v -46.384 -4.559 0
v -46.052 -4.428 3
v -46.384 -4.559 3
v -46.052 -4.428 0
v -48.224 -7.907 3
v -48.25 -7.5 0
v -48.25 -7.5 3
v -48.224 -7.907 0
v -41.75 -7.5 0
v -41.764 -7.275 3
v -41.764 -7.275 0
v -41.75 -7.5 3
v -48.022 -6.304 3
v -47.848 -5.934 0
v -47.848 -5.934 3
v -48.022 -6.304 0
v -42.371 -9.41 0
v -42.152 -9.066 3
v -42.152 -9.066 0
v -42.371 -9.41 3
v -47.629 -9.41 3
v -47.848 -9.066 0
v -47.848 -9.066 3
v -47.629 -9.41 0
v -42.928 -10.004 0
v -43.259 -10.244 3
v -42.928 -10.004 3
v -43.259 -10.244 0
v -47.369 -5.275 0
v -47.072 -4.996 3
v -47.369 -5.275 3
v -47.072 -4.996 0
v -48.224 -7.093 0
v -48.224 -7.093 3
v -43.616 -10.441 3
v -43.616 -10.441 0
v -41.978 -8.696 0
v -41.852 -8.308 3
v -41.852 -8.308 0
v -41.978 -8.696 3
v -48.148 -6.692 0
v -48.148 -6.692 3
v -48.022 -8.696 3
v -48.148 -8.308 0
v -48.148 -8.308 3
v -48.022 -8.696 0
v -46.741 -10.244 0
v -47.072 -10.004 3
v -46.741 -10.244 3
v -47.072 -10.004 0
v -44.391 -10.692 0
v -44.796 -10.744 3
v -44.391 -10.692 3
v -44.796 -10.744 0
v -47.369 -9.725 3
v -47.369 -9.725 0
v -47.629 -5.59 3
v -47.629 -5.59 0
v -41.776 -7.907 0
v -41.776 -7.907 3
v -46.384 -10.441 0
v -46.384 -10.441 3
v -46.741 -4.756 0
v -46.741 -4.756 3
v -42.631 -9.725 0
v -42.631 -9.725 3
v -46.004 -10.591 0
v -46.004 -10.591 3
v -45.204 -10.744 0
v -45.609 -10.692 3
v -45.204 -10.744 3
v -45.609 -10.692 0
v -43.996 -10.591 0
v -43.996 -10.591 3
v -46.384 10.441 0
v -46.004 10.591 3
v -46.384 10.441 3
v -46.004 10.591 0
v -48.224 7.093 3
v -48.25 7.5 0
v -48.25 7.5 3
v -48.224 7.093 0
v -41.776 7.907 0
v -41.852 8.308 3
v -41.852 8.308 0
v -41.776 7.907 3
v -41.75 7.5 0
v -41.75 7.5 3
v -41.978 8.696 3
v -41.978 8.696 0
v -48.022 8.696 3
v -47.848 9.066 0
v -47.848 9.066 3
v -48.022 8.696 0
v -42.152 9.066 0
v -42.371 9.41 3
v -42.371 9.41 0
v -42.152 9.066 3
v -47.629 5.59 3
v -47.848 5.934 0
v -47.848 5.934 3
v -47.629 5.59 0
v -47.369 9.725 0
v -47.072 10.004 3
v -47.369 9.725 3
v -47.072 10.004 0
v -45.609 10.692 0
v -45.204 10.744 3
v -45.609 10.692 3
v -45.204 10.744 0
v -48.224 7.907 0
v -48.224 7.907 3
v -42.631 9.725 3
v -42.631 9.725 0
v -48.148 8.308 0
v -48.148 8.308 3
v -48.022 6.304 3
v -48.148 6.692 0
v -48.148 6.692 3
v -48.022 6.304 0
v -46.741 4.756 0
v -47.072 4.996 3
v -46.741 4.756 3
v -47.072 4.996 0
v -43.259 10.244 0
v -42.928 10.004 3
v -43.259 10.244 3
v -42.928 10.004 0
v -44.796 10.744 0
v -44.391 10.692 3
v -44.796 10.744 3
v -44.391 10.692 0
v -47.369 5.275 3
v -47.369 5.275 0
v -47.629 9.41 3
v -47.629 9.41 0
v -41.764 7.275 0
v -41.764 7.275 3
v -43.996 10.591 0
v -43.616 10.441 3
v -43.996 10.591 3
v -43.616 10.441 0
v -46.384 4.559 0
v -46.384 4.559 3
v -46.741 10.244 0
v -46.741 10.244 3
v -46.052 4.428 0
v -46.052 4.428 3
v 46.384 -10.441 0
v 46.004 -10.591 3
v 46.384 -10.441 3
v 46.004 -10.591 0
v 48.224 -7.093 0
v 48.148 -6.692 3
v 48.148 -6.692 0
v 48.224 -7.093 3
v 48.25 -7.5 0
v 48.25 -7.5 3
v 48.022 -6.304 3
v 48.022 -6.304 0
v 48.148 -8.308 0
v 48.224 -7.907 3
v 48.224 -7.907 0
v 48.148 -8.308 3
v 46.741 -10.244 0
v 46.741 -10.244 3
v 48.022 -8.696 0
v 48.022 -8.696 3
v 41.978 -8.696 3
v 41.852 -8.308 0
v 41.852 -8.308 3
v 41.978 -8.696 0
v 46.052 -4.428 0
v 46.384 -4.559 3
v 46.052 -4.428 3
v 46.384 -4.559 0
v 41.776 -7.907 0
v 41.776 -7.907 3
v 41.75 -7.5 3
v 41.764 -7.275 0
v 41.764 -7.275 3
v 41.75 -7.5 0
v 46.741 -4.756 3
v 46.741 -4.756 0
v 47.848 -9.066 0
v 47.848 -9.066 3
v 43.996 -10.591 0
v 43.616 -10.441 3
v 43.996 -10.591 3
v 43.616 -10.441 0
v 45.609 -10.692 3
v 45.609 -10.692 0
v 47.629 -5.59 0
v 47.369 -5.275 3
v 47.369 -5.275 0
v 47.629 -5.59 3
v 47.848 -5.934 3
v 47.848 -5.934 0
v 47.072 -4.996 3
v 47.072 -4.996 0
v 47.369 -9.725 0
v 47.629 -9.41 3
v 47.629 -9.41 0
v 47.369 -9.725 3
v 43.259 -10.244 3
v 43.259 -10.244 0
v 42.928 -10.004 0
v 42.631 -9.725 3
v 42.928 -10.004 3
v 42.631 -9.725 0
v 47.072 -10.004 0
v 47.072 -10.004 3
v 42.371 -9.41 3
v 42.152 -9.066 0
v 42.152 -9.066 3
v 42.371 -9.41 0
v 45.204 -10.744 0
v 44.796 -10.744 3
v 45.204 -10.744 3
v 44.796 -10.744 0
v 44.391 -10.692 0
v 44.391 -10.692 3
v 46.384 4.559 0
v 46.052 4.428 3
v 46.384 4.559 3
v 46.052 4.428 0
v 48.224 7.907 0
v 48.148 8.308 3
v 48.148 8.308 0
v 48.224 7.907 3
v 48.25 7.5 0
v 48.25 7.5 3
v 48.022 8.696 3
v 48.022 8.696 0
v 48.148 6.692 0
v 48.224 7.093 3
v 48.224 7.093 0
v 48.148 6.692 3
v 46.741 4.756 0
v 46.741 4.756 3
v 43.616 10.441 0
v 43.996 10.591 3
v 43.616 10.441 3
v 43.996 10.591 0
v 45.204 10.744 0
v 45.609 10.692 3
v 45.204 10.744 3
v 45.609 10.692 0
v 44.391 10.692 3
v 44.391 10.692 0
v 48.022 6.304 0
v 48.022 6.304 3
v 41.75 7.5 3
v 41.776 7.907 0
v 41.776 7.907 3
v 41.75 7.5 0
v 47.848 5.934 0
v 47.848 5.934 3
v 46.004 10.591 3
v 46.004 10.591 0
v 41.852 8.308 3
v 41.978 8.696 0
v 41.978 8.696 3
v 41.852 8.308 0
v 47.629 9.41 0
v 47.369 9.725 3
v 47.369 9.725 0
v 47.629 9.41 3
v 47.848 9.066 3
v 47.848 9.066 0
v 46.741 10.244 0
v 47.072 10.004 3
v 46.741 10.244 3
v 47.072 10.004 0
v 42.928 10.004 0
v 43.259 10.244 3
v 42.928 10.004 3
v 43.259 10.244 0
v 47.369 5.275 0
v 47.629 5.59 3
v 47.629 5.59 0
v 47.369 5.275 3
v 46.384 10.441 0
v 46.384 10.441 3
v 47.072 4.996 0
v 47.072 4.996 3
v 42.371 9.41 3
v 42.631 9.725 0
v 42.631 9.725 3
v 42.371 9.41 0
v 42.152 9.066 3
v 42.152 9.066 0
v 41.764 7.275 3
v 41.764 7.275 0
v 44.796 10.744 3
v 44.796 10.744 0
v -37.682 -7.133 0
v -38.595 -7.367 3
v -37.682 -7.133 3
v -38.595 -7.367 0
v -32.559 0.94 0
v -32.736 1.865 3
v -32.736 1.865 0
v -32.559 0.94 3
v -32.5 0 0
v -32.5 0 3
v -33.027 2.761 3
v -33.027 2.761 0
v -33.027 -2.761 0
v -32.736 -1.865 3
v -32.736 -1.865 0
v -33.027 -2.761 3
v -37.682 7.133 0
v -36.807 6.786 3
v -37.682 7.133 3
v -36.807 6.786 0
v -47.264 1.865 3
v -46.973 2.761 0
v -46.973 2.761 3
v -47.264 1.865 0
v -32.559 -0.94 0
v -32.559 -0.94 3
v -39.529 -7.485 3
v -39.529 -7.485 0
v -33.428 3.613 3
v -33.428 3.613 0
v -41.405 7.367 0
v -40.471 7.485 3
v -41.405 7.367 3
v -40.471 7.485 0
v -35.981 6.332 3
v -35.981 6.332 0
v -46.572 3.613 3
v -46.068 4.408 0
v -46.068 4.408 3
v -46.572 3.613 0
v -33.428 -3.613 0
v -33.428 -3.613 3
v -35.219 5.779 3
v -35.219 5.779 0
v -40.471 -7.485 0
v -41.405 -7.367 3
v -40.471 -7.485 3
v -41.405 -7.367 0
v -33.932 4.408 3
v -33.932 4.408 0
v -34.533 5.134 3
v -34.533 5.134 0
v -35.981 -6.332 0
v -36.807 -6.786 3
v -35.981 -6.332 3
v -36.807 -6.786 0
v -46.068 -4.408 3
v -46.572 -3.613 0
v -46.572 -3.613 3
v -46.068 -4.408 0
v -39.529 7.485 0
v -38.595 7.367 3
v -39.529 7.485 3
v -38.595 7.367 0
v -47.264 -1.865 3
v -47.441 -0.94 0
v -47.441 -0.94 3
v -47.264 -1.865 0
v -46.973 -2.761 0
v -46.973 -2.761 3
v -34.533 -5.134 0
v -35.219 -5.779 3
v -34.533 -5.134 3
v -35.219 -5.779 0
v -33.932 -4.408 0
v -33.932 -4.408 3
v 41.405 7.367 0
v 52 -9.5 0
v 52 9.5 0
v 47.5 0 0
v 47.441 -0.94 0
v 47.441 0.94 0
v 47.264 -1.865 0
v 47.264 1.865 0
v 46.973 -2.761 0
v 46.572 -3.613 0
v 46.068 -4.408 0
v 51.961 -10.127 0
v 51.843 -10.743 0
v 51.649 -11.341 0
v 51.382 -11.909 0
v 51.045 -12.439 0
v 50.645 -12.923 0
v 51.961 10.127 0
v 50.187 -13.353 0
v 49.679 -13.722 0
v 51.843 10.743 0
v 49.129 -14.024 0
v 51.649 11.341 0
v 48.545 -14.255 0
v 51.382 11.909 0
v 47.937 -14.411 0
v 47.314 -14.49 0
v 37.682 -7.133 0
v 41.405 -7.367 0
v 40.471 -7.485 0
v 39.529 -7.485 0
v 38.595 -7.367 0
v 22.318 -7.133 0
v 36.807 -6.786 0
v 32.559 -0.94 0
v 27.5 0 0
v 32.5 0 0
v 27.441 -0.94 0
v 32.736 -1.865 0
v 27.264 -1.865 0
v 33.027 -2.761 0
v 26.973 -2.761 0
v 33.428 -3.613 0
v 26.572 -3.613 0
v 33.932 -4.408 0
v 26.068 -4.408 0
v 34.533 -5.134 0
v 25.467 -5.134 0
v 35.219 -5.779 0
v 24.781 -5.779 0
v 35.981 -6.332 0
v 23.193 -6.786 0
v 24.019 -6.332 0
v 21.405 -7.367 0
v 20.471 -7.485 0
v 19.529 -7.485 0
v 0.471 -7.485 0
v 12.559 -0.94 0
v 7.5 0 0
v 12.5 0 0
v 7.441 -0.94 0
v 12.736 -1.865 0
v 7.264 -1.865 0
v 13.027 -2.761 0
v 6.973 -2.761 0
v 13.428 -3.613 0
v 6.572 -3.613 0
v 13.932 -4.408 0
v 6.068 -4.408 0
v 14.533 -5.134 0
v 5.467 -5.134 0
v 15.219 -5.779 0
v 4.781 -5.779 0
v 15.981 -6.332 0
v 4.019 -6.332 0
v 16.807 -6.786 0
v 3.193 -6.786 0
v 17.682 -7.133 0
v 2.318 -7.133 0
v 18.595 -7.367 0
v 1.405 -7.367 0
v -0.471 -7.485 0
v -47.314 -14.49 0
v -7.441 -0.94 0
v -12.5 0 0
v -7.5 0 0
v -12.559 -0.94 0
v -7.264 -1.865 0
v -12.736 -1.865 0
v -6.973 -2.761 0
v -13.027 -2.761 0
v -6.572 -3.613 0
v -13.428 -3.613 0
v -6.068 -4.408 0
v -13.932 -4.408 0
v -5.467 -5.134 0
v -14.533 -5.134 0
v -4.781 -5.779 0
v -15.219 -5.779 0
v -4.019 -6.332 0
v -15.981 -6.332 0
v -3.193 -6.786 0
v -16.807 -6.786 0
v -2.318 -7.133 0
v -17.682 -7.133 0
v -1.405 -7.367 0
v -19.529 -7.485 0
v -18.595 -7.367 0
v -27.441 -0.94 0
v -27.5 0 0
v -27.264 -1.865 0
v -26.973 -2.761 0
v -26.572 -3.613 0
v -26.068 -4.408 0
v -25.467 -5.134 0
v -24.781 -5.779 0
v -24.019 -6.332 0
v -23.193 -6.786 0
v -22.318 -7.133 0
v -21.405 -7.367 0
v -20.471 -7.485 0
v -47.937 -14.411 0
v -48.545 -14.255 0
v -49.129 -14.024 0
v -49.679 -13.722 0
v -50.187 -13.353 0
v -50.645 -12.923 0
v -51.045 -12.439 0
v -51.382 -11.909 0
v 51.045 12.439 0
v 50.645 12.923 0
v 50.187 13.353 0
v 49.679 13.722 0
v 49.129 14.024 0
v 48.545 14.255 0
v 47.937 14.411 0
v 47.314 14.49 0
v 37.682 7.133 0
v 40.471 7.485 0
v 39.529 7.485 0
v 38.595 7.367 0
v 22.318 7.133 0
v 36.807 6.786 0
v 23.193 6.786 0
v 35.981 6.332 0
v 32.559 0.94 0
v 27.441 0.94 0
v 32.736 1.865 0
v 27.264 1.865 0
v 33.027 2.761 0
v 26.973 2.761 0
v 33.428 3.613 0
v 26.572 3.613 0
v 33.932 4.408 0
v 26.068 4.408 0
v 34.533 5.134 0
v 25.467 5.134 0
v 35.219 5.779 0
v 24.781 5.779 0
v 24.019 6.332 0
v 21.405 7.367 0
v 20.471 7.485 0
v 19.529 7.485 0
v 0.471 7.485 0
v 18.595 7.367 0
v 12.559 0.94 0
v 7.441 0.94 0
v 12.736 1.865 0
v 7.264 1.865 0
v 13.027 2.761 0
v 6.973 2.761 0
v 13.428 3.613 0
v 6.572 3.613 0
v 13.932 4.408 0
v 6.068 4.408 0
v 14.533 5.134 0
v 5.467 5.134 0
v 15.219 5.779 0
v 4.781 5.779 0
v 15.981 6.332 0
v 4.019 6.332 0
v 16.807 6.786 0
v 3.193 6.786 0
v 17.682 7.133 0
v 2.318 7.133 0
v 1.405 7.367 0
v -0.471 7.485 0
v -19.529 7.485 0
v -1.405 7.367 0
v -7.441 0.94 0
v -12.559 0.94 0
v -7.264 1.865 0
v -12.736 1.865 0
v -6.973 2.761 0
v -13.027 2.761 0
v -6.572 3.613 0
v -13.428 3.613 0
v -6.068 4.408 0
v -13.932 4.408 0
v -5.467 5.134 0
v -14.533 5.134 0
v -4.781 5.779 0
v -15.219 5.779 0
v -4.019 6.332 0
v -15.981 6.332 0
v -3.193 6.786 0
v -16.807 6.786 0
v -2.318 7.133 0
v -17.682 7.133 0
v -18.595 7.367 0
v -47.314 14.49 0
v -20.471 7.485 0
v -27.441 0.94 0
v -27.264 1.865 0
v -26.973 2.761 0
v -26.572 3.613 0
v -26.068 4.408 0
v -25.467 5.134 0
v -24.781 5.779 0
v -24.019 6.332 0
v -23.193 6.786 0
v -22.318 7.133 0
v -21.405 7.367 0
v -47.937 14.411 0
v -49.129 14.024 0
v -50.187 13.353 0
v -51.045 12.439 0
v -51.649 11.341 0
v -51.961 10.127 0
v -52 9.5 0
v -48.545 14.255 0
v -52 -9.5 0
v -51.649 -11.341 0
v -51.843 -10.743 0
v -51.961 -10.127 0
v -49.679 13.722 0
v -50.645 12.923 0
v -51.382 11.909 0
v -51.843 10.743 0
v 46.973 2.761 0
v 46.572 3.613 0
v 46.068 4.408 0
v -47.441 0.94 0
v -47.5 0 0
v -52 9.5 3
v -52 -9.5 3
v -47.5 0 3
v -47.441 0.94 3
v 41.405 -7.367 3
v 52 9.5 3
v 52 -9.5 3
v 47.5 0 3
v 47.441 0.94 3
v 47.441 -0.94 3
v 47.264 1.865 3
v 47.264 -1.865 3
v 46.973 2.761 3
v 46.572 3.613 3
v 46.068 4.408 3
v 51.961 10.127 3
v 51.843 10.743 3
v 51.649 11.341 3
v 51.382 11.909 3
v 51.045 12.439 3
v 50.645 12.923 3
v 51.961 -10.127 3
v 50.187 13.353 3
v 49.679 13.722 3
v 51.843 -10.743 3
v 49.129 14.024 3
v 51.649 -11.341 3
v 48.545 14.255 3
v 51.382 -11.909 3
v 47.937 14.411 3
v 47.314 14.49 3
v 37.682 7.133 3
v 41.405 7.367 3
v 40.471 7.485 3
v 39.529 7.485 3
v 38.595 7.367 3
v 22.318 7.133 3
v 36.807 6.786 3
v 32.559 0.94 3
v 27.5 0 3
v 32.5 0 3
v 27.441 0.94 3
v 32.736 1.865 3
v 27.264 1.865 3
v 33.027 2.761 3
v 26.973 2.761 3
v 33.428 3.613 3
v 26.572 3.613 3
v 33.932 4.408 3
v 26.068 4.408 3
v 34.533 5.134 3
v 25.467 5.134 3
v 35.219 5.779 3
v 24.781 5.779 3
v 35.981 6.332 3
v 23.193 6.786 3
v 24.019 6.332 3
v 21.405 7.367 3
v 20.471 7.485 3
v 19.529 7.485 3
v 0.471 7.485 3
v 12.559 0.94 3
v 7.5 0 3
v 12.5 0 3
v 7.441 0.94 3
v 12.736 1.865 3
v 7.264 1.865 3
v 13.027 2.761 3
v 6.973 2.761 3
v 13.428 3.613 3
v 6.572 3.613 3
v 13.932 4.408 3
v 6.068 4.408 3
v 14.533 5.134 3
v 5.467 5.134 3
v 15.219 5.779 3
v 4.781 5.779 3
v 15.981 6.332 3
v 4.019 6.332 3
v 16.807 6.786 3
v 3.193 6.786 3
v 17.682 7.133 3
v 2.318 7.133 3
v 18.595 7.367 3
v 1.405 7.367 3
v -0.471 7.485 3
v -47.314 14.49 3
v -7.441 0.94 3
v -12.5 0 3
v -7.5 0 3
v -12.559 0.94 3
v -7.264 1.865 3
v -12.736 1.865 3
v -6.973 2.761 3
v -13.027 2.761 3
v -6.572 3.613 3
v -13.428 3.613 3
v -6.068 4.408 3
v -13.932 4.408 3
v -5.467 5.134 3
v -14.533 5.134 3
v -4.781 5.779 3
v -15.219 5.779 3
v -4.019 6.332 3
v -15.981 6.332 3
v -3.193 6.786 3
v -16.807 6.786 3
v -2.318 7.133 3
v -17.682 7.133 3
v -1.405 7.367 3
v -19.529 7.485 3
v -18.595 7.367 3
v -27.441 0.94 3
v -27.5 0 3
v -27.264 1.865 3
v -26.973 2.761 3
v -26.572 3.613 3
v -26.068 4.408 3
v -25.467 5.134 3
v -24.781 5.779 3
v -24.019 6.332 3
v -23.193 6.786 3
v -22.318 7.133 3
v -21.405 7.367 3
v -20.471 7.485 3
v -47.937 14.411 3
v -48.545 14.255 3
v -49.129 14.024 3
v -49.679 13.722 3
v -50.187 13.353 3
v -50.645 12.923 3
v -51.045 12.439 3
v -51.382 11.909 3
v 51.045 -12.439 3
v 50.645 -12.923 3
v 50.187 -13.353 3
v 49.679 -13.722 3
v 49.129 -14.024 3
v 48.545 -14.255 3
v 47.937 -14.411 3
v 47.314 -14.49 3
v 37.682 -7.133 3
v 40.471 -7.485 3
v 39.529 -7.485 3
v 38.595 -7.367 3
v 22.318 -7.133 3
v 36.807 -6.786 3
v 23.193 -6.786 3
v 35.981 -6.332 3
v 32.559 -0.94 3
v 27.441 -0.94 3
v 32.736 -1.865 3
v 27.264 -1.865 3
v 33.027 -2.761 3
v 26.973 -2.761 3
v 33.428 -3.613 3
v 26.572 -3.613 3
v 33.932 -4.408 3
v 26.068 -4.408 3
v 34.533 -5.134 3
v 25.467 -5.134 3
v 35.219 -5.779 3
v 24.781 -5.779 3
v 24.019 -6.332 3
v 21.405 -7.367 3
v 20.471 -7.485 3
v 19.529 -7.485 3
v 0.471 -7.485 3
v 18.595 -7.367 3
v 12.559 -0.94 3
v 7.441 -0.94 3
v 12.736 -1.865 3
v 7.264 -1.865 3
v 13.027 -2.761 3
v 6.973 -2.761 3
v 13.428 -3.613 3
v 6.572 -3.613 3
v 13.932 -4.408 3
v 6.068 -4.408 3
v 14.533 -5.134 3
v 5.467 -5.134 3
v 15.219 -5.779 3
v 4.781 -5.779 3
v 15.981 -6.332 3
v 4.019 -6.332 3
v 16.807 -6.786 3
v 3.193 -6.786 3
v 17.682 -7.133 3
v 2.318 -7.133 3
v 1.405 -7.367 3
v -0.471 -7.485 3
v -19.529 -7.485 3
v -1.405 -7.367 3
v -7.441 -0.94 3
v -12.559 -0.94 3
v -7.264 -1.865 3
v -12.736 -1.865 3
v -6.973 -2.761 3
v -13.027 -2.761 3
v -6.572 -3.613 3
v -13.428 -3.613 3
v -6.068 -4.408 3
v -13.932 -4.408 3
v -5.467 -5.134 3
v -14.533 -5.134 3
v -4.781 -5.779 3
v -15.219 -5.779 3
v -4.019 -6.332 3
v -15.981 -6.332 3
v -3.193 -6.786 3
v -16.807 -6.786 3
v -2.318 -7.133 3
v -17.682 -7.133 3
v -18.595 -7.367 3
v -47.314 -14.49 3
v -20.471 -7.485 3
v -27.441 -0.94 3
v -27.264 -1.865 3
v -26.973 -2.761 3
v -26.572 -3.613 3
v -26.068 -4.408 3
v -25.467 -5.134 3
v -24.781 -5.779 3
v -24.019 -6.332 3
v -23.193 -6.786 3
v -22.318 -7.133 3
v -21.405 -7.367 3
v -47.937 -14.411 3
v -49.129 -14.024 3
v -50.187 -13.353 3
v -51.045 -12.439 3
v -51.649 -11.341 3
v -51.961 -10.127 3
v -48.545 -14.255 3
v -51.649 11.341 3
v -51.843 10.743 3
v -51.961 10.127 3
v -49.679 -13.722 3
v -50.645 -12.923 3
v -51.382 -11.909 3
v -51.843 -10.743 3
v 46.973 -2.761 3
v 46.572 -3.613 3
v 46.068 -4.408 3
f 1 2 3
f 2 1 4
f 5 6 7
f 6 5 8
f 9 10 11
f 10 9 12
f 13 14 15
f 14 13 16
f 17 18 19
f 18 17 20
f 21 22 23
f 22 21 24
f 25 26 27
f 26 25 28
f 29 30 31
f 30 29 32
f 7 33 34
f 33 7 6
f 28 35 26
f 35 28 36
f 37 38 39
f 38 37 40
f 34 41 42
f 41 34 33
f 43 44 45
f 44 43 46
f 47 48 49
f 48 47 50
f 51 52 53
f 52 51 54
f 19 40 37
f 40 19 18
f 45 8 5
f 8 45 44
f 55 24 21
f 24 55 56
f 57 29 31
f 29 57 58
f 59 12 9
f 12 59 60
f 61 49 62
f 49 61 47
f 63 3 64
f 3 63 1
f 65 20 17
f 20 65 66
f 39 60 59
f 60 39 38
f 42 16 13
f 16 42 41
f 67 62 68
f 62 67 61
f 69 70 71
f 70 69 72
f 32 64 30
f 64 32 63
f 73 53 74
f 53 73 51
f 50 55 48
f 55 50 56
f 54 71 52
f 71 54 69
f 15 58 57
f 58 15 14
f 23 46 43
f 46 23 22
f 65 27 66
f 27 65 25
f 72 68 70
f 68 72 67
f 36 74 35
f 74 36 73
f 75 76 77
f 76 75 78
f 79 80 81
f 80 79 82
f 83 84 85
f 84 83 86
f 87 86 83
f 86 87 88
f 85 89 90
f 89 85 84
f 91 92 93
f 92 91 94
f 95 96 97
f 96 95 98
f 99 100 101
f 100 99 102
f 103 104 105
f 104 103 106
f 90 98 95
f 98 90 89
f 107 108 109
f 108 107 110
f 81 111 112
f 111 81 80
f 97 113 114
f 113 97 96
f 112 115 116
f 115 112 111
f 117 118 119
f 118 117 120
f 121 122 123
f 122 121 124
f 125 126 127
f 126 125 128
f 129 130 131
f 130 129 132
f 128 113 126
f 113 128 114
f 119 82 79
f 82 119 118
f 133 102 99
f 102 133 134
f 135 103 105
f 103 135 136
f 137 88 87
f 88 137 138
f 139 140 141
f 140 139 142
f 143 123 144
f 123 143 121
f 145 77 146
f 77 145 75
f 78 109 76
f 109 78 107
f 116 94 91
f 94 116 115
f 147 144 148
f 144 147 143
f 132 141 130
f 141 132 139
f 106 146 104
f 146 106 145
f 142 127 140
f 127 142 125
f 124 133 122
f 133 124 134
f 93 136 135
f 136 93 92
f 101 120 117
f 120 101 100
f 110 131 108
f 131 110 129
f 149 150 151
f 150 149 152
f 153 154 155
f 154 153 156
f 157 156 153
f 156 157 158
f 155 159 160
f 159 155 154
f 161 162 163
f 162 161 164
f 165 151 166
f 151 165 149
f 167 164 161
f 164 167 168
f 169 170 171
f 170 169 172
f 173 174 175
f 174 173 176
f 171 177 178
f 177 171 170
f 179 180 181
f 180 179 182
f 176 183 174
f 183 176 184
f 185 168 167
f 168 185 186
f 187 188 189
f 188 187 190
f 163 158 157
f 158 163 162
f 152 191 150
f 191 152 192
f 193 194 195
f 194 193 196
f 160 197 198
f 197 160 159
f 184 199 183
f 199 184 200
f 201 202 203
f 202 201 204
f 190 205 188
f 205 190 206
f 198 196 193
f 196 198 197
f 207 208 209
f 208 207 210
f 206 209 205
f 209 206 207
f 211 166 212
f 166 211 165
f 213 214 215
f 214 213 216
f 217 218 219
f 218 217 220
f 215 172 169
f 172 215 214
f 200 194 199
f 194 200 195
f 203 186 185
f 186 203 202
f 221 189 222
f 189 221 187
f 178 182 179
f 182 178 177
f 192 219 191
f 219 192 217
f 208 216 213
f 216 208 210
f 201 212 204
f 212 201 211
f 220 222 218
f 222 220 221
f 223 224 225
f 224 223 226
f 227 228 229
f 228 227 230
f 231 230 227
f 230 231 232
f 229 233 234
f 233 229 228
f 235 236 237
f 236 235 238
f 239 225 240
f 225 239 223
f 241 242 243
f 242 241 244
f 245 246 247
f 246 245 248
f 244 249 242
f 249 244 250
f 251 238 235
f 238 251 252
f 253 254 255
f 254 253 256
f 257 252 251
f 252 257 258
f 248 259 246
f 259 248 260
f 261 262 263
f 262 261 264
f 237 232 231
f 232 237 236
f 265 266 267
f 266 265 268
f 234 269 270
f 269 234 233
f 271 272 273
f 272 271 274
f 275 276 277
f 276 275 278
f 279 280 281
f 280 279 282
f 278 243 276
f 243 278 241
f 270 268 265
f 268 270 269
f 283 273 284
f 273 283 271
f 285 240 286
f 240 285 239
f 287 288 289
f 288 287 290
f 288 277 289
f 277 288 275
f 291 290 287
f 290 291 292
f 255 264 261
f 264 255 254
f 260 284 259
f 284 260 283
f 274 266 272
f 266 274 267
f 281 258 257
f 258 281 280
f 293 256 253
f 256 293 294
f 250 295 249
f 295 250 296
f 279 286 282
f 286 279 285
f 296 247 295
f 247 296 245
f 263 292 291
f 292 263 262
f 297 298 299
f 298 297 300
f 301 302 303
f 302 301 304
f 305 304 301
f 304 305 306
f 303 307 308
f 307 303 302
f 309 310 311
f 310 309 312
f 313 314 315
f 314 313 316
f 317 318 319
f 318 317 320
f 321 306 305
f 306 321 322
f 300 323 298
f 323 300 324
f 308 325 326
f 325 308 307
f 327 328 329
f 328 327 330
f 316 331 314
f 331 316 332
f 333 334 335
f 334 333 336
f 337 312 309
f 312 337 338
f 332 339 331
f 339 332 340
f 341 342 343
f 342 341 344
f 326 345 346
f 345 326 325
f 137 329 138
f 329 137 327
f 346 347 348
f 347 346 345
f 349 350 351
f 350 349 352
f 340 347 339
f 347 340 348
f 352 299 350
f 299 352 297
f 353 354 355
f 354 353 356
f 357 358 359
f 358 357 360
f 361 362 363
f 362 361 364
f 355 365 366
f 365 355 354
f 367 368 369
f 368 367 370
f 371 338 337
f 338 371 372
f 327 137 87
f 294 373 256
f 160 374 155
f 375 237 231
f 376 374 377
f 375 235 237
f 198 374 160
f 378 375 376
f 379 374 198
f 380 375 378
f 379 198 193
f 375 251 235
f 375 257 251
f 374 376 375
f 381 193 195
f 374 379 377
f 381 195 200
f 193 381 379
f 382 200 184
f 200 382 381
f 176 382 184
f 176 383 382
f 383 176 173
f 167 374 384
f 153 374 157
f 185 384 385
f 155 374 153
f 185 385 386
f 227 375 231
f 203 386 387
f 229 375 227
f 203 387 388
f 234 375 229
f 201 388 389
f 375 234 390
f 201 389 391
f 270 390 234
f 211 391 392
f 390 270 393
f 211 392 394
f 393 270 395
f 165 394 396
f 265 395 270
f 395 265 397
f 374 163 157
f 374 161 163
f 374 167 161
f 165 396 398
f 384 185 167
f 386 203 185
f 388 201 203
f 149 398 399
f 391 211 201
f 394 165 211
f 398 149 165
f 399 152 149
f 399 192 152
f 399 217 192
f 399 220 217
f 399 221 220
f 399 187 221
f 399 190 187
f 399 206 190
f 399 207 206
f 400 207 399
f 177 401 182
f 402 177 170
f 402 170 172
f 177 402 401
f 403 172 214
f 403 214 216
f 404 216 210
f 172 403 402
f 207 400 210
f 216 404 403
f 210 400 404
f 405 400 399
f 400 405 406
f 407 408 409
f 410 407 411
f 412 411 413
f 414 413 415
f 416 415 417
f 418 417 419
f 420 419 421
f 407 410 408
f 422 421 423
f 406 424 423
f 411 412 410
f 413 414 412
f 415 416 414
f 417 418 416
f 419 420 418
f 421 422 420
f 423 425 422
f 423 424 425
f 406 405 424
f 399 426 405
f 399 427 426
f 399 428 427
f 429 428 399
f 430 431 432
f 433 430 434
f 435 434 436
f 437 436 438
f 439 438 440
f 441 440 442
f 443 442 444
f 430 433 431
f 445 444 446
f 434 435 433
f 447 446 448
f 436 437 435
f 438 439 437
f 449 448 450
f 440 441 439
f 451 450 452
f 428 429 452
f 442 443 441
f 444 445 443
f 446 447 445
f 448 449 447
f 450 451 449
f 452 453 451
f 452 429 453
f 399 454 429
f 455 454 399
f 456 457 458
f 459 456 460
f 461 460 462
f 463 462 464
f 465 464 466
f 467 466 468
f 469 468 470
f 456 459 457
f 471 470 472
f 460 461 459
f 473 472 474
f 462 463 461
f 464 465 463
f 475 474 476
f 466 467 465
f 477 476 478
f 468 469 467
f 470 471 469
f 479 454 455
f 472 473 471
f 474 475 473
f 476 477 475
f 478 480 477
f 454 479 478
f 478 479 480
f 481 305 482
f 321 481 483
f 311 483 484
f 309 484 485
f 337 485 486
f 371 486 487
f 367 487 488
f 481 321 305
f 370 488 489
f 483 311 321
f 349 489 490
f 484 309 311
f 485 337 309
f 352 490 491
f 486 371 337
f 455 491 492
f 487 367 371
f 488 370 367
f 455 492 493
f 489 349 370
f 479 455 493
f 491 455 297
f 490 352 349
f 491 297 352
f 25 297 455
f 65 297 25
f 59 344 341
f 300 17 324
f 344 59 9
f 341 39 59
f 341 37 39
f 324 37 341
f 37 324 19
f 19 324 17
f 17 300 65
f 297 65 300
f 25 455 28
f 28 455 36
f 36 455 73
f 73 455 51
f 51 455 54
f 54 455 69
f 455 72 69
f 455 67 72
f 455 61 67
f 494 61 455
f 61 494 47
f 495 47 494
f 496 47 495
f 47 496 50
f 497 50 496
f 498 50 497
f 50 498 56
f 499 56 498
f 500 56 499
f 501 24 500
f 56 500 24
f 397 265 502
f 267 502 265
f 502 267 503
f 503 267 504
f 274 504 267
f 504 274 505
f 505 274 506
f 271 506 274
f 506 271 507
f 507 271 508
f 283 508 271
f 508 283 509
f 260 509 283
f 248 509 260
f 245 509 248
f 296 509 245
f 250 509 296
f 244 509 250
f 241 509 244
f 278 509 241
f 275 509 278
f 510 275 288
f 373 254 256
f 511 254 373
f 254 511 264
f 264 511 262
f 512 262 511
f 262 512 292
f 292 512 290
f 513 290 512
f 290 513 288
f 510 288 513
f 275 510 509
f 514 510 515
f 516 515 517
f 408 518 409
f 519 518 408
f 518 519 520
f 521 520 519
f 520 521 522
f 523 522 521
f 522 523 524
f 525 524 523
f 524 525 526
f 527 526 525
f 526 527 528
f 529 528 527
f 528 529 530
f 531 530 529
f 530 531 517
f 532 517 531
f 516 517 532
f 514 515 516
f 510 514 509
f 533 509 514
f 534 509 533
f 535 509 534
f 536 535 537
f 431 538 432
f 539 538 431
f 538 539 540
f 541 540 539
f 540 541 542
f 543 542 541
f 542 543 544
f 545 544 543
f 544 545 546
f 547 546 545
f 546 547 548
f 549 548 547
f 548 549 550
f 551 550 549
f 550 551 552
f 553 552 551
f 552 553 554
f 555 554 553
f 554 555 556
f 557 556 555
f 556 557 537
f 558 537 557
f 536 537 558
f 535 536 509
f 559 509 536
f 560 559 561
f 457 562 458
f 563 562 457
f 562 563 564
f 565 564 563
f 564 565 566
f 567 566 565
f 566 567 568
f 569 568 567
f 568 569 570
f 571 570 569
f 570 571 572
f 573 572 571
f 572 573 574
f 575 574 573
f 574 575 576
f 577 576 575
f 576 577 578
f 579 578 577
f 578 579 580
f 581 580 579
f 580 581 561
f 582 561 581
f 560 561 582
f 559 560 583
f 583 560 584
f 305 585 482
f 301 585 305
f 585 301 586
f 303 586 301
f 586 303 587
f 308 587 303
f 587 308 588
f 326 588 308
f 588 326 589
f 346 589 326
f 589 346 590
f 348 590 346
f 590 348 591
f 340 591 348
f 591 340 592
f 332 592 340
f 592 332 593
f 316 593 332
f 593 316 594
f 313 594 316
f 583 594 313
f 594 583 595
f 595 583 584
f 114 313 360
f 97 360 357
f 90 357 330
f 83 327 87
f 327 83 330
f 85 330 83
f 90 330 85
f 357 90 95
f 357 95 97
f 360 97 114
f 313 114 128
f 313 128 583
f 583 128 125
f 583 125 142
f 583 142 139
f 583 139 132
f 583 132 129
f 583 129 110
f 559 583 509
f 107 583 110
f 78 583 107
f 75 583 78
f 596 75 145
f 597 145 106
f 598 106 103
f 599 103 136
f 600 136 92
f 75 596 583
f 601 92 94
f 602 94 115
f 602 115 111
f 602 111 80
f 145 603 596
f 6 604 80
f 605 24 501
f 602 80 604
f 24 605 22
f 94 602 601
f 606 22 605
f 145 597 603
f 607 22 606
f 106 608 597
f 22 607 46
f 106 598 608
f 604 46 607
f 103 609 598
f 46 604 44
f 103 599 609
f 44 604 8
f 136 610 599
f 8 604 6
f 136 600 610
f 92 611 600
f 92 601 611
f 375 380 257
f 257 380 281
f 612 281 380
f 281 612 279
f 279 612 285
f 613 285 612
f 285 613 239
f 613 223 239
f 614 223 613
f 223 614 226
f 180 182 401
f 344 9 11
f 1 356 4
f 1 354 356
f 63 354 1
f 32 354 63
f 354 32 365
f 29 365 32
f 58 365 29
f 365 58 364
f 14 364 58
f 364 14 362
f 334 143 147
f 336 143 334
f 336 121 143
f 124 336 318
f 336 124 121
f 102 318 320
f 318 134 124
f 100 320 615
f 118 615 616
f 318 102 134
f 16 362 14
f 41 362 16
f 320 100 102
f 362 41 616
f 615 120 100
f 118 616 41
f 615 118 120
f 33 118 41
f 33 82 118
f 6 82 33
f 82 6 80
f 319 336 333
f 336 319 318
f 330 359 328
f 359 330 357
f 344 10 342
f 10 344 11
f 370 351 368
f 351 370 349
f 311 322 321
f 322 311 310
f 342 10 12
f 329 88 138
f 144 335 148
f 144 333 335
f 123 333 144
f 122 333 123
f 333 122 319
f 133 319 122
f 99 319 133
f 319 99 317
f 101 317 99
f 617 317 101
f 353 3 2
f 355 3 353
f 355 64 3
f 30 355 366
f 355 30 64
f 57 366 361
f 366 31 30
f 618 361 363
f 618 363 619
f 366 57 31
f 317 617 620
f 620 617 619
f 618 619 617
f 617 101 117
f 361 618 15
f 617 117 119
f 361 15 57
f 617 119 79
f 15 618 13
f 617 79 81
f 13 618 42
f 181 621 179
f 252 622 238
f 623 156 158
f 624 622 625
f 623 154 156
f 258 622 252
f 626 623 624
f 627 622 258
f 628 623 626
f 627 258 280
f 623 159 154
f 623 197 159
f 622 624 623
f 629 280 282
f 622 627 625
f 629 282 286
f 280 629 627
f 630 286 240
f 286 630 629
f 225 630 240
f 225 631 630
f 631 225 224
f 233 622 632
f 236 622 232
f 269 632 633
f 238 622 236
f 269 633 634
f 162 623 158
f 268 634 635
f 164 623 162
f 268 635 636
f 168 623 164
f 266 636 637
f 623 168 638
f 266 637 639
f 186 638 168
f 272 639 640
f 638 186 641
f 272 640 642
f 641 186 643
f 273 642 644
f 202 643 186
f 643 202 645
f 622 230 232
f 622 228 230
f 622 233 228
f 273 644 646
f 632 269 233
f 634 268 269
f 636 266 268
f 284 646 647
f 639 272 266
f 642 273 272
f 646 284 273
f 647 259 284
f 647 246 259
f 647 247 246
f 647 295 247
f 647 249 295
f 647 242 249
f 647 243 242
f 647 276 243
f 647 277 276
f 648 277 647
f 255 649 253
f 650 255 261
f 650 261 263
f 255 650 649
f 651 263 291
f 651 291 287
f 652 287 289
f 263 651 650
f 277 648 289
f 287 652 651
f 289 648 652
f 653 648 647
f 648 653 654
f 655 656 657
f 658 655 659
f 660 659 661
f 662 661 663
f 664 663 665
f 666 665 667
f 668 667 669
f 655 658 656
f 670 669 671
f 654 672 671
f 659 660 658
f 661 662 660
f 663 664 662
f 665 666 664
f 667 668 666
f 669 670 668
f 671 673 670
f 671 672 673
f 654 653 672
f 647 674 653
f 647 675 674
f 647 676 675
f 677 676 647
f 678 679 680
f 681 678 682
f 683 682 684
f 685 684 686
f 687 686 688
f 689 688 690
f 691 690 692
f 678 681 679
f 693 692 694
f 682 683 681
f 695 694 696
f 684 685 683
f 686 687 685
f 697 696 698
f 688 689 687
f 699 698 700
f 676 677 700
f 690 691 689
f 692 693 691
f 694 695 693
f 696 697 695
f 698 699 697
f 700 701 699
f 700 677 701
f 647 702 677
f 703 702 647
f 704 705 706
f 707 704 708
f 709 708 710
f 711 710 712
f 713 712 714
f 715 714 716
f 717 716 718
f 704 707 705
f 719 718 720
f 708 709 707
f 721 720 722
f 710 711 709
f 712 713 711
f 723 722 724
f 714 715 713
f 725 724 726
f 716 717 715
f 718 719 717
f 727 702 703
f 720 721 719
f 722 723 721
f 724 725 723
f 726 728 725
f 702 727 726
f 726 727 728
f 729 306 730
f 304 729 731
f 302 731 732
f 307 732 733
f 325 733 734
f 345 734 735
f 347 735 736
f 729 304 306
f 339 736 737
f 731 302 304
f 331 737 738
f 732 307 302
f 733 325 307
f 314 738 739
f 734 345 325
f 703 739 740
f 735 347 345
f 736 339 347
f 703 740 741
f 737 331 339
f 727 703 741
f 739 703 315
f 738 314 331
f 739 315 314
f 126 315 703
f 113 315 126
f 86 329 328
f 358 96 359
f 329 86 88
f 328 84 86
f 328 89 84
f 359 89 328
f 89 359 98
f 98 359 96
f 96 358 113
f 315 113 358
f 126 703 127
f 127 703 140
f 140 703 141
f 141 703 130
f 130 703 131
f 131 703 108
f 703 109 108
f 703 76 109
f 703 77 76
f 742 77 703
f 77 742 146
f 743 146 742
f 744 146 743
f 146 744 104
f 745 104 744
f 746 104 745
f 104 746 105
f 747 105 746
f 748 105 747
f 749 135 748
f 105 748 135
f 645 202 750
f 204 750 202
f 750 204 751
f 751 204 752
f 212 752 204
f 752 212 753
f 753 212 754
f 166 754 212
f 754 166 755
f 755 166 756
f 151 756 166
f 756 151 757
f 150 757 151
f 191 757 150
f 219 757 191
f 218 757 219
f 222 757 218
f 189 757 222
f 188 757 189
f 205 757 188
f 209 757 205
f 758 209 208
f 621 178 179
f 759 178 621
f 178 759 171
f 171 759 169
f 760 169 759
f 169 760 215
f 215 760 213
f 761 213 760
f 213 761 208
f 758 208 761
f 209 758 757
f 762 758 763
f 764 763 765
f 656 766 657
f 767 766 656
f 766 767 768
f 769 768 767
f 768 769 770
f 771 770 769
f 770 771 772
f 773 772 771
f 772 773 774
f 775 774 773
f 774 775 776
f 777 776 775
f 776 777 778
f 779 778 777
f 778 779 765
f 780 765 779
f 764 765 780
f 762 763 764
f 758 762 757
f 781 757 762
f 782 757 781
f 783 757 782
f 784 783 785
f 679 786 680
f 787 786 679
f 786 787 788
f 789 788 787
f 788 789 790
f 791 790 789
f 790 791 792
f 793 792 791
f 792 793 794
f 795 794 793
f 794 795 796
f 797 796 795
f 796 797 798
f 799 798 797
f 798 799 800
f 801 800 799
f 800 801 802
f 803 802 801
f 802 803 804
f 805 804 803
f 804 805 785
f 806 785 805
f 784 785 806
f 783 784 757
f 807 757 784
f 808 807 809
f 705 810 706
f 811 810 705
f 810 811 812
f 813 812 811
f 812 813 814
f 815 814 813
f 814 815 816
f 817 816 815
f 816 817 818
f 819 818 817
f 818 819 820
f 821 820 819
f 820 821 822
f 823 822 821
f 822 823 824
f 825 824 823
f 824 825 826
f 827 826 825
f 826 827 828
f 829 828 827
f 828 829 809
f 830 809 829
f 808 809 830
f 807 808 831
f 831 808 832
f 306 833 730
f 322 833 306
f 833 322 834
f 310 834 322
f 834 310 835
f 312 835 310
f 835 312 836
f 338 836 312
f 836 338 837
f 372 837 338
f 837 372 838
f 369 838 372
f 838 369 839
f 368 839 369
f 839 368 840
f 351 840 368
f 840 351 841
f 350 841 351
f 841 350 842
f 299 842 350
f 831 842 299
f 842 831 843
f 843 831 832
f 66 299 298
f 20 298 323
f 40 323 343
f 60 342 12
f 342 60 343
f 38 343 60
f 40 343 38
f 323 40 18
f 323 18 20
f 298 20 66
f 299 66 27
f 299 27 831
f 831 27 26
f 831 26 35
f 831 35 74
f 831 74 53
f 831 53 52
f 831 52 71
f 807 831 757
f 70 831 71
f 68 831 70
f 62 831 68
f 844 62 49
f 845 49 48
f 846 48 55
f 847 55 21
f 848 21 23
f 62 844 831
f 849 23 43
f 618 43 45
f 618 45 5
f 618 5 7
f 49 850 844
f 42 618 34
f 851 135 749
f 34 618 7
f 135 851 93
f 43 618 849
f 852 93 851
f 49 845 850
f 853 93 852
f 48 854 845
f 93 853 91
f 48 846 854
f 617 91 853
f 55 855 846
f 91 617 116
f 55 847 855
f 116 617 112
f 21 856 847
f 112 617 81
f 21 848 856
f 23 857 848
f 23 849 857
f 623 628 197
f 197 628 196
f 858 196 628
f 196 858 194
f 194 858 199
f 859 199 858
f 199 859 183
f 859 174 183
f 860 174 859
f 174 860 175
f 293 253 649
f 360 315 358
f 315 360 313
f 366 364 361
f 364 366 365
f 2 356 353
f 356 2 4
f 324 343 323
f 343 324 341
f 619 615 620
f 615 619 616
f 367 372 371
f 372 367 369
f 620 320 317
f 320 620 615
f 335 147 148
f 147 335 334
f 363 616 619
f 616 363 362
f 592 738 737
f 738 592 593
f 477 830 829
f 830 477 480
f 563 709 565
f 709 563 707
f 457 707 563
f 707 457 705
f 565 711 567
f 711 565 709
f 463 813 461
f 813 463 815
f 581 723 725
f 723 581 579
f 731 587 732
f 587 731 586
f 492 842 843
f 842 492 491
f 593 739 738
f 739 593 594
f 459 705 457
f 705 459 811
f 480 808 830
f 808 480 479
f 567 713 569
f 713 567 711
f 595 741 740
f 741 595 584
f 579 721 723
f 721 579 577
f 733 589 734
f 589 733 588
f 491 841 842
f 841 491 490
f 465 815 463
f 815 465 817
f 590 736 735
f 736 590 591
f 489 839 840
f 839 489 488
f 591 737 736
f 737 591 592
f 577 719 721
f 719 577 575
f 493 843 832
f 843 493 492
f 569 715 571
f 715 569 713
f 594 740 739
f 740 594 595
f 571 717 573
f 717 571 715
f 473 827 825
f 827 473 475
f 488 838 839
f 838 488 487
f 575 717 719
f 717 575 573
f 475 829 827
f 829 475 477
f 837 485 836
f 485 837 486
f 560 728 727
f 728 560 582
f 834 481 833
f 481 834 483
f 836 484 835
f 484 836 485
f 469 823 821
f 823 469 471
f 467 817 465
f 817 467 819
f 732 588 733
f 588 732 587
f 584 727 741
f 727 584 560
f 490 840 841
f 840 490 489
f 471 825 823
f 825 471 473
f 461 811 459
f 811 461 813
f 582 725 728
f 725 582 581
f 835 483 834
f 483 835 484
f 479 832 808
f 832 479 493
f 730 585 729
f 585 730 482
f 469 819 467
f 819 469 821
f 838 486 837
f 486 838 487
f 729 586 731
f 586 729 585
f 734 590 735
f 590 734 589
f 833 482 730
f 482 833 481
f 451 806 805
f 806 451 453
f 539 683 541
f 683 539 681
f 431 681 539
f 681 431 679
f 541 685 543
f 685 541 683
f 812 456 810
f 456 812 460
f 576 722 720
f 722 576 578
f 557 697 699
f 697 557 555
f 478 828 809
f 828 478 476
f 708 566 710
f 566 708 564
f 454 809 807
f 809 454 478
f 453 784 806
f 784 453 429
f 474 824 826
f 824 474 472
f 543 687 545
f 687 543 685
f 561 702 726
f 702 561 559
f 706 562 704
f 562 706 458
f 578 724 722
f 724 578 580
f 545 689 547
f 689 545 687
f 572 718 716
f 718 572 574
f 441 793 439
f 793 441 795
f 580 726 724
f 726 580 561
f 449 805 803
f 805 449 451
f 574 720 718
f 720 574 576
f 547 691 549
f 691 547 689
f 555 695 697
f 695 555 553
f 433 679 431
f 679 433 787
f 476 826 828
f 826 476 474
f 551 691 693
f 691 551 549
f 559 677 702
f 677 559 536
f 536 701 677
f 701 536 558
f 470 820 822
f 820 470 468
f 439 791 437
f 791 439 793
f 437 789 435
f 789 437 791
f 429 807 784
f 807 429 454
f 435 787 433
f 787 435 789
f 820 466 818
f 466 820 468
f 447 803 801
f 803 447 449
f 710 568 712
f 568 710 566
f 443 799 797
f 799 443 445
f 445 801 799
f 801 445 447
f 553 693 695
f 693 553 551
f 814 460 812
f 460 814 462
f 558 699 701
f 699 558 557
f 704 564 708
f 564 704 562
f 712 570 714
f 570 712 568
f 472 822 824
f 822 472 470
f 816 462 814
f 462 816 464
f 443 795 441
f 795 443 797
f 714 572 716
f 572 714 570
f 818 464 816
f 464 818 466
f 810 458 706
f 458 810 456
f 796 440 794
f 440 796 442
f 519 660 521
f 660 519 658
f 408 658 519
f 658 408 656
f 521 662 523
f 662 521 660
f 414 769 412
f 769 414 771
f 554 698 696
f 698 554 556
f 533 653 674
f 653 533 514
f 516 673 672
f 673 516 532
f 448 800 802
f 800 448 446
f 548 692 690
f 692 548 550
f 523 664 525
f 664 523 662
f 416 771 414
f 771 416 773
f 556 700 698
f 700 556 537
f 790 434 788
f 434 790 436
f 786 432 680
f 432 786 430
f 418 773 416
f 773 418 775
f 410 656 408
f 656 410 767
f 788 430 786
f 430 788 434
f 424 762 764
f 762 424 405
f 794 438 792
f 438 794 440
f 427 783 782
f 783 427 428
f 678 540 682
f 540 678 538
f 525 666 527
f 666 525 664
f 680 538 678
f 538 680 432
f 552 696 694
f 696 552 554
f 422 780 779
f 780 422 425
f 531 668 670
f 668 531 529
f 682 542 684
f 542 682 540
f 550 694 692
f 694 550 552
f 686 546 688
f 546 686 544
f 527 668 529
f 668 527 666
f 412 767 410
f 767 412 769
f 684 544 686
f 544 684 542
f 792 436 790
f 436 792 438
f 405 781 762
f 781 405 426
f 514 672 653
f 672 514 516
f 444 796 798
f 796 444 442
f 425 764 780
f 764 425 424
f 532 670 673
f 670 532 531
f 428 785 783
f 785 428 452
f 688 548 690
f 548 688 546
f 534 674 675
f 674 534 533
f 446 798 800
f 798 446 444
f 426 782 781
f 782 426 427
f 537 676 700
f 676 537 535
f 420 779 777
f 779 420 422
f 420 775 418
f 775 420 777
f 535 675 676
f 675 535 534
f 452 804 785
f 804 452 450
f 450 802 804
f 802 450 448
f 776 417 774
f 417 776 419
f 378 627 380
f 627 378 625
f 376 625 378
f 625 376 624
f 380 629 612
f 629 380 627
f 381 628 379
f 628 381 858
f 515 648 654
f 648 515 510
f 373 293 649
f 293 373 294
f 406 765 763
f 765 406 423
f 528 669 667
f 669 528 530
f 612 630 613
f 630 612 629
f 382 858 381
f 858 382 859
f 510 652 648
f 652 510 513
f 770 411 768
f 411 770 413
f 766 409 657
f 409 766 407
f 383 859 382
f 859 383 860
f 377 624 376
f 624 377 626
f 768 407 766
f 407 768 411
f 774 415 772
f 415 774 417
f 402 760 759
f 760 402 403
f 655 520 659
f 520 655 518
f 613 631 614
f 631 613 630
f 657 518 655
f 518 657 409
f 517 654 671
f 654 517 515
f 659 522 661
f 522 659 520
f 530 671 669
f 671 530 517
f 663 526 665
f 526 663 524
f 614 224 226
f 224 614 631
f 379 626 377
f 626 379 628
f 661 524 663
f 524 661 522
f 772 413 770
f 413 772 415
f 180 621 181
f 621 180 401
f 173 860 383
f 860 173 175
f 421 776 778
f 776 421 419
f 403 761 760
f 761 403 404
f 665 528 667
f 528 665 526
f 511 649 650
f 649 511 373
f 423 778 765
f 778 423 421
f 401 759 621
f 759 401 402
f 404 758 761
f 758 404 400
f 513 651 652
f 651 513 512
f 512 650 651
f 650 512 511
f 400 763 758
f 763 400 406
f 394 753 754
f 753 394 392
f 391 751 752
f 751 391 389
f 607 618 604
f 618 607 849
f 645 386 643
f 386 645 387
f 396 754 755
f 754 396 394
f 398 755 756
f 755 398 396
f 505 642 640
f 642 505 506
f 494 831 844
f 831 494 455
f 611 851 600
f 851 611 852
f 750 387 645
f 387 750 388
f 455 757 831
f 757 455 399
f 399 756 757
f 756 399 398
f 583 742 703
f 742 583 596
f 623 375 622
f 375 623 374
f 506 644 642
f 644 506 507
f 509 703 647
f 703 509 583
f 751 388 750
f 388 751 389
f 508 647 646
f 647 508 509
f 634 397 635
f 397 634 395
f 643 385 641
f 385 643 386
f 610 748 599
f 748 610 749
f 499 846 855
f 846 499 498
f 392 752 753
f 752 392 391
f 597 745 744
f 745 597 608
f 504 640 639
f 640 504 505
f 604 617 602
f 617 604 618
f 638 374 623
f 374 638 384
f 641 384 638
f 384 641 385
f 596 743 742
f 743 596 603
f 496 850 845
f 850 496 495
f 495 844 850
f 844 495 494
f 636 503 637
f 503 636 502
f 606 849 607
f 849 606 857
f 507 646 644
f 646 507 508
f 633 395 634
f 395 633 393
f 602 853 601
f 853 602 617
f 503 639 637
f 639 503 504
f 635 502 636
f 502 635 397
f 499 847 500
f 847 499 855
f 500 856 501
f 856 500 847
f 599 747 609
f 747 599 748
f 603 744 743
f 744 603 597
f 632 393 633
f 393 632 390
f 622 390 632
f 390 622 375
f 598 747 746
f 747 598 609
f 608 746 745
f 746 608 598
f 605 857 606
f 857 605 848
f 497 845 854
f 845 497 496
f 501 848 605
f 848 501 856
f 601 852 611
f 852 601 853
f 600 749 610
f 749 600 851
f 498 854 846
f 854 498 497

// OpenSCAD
$fn = 50;

difference() {
	union() {
		hull() {
			translate(v = [-47.0, 9.5, 0]) {
				cylinder(h = 3, r = 5);
			}
			translate(v = [47.0, 9.5, 0]) {
				cylinder(h = 3, r = 5);
			}
			translate(v = [-47.0, -9.5, 0]) {
				cylinder(h = 3, r = 5);
			}
			translate(v = [47.0, -9.5, 0]) {
				cylinder(h = 3, r = 5);
			}
		}
	}
	union() {
		translate(v = [-45.0, -7.5, -100.0]) {
			cylinder(h = 200, r = 3.25);
		}
		translate(v = [-45.0, 7.5, -100.0]) {
			cylinder(h = 200, r = 3.25);
		}
		translate(v = [45.0, -7.5, -100.0]) {
			cylinder(h = 200, r = 3.25);
		}
		translate(v = [45.0, 7.5, -100.0]) {
			cylinder(h = 200, r = 3.25);
		}
		translate(v = [-45.0, -7.5, -100.0]) {
			cylinder(h = 200, r = 1.8);
		}
		translate(v = [-45.0, 7.5, -100.0]) {
			cylinder(h = 200, r = 1.8);
		}
		translate(v = [45.0, -7.5, -100.0]) {
			cylinder(h = 200, r = 1.8);
		}
		translate(v = [45.0, 7.5, -100.0]) {
			cylinder(h = 200, r = 1.8);
		}
		translate(v = [-40.0, 0, 0.0]) {
			cylinder(h = 3, r = 7.5);
		}
		translate(v = [-20.0, 0, 0.0]) {
			cylinder(h = 3, r = 7.5);
		}
		cylinder(h = 3, r = 7.5);
		translate(v = [20.0, 0, 0.0]) {
			cylinder(h = 3, r = 7.5);
		}
		translate(v = [40.0, 0, 0.0]) {
			cylinder(h = 3, r = 7.5);
		}
	}
}
